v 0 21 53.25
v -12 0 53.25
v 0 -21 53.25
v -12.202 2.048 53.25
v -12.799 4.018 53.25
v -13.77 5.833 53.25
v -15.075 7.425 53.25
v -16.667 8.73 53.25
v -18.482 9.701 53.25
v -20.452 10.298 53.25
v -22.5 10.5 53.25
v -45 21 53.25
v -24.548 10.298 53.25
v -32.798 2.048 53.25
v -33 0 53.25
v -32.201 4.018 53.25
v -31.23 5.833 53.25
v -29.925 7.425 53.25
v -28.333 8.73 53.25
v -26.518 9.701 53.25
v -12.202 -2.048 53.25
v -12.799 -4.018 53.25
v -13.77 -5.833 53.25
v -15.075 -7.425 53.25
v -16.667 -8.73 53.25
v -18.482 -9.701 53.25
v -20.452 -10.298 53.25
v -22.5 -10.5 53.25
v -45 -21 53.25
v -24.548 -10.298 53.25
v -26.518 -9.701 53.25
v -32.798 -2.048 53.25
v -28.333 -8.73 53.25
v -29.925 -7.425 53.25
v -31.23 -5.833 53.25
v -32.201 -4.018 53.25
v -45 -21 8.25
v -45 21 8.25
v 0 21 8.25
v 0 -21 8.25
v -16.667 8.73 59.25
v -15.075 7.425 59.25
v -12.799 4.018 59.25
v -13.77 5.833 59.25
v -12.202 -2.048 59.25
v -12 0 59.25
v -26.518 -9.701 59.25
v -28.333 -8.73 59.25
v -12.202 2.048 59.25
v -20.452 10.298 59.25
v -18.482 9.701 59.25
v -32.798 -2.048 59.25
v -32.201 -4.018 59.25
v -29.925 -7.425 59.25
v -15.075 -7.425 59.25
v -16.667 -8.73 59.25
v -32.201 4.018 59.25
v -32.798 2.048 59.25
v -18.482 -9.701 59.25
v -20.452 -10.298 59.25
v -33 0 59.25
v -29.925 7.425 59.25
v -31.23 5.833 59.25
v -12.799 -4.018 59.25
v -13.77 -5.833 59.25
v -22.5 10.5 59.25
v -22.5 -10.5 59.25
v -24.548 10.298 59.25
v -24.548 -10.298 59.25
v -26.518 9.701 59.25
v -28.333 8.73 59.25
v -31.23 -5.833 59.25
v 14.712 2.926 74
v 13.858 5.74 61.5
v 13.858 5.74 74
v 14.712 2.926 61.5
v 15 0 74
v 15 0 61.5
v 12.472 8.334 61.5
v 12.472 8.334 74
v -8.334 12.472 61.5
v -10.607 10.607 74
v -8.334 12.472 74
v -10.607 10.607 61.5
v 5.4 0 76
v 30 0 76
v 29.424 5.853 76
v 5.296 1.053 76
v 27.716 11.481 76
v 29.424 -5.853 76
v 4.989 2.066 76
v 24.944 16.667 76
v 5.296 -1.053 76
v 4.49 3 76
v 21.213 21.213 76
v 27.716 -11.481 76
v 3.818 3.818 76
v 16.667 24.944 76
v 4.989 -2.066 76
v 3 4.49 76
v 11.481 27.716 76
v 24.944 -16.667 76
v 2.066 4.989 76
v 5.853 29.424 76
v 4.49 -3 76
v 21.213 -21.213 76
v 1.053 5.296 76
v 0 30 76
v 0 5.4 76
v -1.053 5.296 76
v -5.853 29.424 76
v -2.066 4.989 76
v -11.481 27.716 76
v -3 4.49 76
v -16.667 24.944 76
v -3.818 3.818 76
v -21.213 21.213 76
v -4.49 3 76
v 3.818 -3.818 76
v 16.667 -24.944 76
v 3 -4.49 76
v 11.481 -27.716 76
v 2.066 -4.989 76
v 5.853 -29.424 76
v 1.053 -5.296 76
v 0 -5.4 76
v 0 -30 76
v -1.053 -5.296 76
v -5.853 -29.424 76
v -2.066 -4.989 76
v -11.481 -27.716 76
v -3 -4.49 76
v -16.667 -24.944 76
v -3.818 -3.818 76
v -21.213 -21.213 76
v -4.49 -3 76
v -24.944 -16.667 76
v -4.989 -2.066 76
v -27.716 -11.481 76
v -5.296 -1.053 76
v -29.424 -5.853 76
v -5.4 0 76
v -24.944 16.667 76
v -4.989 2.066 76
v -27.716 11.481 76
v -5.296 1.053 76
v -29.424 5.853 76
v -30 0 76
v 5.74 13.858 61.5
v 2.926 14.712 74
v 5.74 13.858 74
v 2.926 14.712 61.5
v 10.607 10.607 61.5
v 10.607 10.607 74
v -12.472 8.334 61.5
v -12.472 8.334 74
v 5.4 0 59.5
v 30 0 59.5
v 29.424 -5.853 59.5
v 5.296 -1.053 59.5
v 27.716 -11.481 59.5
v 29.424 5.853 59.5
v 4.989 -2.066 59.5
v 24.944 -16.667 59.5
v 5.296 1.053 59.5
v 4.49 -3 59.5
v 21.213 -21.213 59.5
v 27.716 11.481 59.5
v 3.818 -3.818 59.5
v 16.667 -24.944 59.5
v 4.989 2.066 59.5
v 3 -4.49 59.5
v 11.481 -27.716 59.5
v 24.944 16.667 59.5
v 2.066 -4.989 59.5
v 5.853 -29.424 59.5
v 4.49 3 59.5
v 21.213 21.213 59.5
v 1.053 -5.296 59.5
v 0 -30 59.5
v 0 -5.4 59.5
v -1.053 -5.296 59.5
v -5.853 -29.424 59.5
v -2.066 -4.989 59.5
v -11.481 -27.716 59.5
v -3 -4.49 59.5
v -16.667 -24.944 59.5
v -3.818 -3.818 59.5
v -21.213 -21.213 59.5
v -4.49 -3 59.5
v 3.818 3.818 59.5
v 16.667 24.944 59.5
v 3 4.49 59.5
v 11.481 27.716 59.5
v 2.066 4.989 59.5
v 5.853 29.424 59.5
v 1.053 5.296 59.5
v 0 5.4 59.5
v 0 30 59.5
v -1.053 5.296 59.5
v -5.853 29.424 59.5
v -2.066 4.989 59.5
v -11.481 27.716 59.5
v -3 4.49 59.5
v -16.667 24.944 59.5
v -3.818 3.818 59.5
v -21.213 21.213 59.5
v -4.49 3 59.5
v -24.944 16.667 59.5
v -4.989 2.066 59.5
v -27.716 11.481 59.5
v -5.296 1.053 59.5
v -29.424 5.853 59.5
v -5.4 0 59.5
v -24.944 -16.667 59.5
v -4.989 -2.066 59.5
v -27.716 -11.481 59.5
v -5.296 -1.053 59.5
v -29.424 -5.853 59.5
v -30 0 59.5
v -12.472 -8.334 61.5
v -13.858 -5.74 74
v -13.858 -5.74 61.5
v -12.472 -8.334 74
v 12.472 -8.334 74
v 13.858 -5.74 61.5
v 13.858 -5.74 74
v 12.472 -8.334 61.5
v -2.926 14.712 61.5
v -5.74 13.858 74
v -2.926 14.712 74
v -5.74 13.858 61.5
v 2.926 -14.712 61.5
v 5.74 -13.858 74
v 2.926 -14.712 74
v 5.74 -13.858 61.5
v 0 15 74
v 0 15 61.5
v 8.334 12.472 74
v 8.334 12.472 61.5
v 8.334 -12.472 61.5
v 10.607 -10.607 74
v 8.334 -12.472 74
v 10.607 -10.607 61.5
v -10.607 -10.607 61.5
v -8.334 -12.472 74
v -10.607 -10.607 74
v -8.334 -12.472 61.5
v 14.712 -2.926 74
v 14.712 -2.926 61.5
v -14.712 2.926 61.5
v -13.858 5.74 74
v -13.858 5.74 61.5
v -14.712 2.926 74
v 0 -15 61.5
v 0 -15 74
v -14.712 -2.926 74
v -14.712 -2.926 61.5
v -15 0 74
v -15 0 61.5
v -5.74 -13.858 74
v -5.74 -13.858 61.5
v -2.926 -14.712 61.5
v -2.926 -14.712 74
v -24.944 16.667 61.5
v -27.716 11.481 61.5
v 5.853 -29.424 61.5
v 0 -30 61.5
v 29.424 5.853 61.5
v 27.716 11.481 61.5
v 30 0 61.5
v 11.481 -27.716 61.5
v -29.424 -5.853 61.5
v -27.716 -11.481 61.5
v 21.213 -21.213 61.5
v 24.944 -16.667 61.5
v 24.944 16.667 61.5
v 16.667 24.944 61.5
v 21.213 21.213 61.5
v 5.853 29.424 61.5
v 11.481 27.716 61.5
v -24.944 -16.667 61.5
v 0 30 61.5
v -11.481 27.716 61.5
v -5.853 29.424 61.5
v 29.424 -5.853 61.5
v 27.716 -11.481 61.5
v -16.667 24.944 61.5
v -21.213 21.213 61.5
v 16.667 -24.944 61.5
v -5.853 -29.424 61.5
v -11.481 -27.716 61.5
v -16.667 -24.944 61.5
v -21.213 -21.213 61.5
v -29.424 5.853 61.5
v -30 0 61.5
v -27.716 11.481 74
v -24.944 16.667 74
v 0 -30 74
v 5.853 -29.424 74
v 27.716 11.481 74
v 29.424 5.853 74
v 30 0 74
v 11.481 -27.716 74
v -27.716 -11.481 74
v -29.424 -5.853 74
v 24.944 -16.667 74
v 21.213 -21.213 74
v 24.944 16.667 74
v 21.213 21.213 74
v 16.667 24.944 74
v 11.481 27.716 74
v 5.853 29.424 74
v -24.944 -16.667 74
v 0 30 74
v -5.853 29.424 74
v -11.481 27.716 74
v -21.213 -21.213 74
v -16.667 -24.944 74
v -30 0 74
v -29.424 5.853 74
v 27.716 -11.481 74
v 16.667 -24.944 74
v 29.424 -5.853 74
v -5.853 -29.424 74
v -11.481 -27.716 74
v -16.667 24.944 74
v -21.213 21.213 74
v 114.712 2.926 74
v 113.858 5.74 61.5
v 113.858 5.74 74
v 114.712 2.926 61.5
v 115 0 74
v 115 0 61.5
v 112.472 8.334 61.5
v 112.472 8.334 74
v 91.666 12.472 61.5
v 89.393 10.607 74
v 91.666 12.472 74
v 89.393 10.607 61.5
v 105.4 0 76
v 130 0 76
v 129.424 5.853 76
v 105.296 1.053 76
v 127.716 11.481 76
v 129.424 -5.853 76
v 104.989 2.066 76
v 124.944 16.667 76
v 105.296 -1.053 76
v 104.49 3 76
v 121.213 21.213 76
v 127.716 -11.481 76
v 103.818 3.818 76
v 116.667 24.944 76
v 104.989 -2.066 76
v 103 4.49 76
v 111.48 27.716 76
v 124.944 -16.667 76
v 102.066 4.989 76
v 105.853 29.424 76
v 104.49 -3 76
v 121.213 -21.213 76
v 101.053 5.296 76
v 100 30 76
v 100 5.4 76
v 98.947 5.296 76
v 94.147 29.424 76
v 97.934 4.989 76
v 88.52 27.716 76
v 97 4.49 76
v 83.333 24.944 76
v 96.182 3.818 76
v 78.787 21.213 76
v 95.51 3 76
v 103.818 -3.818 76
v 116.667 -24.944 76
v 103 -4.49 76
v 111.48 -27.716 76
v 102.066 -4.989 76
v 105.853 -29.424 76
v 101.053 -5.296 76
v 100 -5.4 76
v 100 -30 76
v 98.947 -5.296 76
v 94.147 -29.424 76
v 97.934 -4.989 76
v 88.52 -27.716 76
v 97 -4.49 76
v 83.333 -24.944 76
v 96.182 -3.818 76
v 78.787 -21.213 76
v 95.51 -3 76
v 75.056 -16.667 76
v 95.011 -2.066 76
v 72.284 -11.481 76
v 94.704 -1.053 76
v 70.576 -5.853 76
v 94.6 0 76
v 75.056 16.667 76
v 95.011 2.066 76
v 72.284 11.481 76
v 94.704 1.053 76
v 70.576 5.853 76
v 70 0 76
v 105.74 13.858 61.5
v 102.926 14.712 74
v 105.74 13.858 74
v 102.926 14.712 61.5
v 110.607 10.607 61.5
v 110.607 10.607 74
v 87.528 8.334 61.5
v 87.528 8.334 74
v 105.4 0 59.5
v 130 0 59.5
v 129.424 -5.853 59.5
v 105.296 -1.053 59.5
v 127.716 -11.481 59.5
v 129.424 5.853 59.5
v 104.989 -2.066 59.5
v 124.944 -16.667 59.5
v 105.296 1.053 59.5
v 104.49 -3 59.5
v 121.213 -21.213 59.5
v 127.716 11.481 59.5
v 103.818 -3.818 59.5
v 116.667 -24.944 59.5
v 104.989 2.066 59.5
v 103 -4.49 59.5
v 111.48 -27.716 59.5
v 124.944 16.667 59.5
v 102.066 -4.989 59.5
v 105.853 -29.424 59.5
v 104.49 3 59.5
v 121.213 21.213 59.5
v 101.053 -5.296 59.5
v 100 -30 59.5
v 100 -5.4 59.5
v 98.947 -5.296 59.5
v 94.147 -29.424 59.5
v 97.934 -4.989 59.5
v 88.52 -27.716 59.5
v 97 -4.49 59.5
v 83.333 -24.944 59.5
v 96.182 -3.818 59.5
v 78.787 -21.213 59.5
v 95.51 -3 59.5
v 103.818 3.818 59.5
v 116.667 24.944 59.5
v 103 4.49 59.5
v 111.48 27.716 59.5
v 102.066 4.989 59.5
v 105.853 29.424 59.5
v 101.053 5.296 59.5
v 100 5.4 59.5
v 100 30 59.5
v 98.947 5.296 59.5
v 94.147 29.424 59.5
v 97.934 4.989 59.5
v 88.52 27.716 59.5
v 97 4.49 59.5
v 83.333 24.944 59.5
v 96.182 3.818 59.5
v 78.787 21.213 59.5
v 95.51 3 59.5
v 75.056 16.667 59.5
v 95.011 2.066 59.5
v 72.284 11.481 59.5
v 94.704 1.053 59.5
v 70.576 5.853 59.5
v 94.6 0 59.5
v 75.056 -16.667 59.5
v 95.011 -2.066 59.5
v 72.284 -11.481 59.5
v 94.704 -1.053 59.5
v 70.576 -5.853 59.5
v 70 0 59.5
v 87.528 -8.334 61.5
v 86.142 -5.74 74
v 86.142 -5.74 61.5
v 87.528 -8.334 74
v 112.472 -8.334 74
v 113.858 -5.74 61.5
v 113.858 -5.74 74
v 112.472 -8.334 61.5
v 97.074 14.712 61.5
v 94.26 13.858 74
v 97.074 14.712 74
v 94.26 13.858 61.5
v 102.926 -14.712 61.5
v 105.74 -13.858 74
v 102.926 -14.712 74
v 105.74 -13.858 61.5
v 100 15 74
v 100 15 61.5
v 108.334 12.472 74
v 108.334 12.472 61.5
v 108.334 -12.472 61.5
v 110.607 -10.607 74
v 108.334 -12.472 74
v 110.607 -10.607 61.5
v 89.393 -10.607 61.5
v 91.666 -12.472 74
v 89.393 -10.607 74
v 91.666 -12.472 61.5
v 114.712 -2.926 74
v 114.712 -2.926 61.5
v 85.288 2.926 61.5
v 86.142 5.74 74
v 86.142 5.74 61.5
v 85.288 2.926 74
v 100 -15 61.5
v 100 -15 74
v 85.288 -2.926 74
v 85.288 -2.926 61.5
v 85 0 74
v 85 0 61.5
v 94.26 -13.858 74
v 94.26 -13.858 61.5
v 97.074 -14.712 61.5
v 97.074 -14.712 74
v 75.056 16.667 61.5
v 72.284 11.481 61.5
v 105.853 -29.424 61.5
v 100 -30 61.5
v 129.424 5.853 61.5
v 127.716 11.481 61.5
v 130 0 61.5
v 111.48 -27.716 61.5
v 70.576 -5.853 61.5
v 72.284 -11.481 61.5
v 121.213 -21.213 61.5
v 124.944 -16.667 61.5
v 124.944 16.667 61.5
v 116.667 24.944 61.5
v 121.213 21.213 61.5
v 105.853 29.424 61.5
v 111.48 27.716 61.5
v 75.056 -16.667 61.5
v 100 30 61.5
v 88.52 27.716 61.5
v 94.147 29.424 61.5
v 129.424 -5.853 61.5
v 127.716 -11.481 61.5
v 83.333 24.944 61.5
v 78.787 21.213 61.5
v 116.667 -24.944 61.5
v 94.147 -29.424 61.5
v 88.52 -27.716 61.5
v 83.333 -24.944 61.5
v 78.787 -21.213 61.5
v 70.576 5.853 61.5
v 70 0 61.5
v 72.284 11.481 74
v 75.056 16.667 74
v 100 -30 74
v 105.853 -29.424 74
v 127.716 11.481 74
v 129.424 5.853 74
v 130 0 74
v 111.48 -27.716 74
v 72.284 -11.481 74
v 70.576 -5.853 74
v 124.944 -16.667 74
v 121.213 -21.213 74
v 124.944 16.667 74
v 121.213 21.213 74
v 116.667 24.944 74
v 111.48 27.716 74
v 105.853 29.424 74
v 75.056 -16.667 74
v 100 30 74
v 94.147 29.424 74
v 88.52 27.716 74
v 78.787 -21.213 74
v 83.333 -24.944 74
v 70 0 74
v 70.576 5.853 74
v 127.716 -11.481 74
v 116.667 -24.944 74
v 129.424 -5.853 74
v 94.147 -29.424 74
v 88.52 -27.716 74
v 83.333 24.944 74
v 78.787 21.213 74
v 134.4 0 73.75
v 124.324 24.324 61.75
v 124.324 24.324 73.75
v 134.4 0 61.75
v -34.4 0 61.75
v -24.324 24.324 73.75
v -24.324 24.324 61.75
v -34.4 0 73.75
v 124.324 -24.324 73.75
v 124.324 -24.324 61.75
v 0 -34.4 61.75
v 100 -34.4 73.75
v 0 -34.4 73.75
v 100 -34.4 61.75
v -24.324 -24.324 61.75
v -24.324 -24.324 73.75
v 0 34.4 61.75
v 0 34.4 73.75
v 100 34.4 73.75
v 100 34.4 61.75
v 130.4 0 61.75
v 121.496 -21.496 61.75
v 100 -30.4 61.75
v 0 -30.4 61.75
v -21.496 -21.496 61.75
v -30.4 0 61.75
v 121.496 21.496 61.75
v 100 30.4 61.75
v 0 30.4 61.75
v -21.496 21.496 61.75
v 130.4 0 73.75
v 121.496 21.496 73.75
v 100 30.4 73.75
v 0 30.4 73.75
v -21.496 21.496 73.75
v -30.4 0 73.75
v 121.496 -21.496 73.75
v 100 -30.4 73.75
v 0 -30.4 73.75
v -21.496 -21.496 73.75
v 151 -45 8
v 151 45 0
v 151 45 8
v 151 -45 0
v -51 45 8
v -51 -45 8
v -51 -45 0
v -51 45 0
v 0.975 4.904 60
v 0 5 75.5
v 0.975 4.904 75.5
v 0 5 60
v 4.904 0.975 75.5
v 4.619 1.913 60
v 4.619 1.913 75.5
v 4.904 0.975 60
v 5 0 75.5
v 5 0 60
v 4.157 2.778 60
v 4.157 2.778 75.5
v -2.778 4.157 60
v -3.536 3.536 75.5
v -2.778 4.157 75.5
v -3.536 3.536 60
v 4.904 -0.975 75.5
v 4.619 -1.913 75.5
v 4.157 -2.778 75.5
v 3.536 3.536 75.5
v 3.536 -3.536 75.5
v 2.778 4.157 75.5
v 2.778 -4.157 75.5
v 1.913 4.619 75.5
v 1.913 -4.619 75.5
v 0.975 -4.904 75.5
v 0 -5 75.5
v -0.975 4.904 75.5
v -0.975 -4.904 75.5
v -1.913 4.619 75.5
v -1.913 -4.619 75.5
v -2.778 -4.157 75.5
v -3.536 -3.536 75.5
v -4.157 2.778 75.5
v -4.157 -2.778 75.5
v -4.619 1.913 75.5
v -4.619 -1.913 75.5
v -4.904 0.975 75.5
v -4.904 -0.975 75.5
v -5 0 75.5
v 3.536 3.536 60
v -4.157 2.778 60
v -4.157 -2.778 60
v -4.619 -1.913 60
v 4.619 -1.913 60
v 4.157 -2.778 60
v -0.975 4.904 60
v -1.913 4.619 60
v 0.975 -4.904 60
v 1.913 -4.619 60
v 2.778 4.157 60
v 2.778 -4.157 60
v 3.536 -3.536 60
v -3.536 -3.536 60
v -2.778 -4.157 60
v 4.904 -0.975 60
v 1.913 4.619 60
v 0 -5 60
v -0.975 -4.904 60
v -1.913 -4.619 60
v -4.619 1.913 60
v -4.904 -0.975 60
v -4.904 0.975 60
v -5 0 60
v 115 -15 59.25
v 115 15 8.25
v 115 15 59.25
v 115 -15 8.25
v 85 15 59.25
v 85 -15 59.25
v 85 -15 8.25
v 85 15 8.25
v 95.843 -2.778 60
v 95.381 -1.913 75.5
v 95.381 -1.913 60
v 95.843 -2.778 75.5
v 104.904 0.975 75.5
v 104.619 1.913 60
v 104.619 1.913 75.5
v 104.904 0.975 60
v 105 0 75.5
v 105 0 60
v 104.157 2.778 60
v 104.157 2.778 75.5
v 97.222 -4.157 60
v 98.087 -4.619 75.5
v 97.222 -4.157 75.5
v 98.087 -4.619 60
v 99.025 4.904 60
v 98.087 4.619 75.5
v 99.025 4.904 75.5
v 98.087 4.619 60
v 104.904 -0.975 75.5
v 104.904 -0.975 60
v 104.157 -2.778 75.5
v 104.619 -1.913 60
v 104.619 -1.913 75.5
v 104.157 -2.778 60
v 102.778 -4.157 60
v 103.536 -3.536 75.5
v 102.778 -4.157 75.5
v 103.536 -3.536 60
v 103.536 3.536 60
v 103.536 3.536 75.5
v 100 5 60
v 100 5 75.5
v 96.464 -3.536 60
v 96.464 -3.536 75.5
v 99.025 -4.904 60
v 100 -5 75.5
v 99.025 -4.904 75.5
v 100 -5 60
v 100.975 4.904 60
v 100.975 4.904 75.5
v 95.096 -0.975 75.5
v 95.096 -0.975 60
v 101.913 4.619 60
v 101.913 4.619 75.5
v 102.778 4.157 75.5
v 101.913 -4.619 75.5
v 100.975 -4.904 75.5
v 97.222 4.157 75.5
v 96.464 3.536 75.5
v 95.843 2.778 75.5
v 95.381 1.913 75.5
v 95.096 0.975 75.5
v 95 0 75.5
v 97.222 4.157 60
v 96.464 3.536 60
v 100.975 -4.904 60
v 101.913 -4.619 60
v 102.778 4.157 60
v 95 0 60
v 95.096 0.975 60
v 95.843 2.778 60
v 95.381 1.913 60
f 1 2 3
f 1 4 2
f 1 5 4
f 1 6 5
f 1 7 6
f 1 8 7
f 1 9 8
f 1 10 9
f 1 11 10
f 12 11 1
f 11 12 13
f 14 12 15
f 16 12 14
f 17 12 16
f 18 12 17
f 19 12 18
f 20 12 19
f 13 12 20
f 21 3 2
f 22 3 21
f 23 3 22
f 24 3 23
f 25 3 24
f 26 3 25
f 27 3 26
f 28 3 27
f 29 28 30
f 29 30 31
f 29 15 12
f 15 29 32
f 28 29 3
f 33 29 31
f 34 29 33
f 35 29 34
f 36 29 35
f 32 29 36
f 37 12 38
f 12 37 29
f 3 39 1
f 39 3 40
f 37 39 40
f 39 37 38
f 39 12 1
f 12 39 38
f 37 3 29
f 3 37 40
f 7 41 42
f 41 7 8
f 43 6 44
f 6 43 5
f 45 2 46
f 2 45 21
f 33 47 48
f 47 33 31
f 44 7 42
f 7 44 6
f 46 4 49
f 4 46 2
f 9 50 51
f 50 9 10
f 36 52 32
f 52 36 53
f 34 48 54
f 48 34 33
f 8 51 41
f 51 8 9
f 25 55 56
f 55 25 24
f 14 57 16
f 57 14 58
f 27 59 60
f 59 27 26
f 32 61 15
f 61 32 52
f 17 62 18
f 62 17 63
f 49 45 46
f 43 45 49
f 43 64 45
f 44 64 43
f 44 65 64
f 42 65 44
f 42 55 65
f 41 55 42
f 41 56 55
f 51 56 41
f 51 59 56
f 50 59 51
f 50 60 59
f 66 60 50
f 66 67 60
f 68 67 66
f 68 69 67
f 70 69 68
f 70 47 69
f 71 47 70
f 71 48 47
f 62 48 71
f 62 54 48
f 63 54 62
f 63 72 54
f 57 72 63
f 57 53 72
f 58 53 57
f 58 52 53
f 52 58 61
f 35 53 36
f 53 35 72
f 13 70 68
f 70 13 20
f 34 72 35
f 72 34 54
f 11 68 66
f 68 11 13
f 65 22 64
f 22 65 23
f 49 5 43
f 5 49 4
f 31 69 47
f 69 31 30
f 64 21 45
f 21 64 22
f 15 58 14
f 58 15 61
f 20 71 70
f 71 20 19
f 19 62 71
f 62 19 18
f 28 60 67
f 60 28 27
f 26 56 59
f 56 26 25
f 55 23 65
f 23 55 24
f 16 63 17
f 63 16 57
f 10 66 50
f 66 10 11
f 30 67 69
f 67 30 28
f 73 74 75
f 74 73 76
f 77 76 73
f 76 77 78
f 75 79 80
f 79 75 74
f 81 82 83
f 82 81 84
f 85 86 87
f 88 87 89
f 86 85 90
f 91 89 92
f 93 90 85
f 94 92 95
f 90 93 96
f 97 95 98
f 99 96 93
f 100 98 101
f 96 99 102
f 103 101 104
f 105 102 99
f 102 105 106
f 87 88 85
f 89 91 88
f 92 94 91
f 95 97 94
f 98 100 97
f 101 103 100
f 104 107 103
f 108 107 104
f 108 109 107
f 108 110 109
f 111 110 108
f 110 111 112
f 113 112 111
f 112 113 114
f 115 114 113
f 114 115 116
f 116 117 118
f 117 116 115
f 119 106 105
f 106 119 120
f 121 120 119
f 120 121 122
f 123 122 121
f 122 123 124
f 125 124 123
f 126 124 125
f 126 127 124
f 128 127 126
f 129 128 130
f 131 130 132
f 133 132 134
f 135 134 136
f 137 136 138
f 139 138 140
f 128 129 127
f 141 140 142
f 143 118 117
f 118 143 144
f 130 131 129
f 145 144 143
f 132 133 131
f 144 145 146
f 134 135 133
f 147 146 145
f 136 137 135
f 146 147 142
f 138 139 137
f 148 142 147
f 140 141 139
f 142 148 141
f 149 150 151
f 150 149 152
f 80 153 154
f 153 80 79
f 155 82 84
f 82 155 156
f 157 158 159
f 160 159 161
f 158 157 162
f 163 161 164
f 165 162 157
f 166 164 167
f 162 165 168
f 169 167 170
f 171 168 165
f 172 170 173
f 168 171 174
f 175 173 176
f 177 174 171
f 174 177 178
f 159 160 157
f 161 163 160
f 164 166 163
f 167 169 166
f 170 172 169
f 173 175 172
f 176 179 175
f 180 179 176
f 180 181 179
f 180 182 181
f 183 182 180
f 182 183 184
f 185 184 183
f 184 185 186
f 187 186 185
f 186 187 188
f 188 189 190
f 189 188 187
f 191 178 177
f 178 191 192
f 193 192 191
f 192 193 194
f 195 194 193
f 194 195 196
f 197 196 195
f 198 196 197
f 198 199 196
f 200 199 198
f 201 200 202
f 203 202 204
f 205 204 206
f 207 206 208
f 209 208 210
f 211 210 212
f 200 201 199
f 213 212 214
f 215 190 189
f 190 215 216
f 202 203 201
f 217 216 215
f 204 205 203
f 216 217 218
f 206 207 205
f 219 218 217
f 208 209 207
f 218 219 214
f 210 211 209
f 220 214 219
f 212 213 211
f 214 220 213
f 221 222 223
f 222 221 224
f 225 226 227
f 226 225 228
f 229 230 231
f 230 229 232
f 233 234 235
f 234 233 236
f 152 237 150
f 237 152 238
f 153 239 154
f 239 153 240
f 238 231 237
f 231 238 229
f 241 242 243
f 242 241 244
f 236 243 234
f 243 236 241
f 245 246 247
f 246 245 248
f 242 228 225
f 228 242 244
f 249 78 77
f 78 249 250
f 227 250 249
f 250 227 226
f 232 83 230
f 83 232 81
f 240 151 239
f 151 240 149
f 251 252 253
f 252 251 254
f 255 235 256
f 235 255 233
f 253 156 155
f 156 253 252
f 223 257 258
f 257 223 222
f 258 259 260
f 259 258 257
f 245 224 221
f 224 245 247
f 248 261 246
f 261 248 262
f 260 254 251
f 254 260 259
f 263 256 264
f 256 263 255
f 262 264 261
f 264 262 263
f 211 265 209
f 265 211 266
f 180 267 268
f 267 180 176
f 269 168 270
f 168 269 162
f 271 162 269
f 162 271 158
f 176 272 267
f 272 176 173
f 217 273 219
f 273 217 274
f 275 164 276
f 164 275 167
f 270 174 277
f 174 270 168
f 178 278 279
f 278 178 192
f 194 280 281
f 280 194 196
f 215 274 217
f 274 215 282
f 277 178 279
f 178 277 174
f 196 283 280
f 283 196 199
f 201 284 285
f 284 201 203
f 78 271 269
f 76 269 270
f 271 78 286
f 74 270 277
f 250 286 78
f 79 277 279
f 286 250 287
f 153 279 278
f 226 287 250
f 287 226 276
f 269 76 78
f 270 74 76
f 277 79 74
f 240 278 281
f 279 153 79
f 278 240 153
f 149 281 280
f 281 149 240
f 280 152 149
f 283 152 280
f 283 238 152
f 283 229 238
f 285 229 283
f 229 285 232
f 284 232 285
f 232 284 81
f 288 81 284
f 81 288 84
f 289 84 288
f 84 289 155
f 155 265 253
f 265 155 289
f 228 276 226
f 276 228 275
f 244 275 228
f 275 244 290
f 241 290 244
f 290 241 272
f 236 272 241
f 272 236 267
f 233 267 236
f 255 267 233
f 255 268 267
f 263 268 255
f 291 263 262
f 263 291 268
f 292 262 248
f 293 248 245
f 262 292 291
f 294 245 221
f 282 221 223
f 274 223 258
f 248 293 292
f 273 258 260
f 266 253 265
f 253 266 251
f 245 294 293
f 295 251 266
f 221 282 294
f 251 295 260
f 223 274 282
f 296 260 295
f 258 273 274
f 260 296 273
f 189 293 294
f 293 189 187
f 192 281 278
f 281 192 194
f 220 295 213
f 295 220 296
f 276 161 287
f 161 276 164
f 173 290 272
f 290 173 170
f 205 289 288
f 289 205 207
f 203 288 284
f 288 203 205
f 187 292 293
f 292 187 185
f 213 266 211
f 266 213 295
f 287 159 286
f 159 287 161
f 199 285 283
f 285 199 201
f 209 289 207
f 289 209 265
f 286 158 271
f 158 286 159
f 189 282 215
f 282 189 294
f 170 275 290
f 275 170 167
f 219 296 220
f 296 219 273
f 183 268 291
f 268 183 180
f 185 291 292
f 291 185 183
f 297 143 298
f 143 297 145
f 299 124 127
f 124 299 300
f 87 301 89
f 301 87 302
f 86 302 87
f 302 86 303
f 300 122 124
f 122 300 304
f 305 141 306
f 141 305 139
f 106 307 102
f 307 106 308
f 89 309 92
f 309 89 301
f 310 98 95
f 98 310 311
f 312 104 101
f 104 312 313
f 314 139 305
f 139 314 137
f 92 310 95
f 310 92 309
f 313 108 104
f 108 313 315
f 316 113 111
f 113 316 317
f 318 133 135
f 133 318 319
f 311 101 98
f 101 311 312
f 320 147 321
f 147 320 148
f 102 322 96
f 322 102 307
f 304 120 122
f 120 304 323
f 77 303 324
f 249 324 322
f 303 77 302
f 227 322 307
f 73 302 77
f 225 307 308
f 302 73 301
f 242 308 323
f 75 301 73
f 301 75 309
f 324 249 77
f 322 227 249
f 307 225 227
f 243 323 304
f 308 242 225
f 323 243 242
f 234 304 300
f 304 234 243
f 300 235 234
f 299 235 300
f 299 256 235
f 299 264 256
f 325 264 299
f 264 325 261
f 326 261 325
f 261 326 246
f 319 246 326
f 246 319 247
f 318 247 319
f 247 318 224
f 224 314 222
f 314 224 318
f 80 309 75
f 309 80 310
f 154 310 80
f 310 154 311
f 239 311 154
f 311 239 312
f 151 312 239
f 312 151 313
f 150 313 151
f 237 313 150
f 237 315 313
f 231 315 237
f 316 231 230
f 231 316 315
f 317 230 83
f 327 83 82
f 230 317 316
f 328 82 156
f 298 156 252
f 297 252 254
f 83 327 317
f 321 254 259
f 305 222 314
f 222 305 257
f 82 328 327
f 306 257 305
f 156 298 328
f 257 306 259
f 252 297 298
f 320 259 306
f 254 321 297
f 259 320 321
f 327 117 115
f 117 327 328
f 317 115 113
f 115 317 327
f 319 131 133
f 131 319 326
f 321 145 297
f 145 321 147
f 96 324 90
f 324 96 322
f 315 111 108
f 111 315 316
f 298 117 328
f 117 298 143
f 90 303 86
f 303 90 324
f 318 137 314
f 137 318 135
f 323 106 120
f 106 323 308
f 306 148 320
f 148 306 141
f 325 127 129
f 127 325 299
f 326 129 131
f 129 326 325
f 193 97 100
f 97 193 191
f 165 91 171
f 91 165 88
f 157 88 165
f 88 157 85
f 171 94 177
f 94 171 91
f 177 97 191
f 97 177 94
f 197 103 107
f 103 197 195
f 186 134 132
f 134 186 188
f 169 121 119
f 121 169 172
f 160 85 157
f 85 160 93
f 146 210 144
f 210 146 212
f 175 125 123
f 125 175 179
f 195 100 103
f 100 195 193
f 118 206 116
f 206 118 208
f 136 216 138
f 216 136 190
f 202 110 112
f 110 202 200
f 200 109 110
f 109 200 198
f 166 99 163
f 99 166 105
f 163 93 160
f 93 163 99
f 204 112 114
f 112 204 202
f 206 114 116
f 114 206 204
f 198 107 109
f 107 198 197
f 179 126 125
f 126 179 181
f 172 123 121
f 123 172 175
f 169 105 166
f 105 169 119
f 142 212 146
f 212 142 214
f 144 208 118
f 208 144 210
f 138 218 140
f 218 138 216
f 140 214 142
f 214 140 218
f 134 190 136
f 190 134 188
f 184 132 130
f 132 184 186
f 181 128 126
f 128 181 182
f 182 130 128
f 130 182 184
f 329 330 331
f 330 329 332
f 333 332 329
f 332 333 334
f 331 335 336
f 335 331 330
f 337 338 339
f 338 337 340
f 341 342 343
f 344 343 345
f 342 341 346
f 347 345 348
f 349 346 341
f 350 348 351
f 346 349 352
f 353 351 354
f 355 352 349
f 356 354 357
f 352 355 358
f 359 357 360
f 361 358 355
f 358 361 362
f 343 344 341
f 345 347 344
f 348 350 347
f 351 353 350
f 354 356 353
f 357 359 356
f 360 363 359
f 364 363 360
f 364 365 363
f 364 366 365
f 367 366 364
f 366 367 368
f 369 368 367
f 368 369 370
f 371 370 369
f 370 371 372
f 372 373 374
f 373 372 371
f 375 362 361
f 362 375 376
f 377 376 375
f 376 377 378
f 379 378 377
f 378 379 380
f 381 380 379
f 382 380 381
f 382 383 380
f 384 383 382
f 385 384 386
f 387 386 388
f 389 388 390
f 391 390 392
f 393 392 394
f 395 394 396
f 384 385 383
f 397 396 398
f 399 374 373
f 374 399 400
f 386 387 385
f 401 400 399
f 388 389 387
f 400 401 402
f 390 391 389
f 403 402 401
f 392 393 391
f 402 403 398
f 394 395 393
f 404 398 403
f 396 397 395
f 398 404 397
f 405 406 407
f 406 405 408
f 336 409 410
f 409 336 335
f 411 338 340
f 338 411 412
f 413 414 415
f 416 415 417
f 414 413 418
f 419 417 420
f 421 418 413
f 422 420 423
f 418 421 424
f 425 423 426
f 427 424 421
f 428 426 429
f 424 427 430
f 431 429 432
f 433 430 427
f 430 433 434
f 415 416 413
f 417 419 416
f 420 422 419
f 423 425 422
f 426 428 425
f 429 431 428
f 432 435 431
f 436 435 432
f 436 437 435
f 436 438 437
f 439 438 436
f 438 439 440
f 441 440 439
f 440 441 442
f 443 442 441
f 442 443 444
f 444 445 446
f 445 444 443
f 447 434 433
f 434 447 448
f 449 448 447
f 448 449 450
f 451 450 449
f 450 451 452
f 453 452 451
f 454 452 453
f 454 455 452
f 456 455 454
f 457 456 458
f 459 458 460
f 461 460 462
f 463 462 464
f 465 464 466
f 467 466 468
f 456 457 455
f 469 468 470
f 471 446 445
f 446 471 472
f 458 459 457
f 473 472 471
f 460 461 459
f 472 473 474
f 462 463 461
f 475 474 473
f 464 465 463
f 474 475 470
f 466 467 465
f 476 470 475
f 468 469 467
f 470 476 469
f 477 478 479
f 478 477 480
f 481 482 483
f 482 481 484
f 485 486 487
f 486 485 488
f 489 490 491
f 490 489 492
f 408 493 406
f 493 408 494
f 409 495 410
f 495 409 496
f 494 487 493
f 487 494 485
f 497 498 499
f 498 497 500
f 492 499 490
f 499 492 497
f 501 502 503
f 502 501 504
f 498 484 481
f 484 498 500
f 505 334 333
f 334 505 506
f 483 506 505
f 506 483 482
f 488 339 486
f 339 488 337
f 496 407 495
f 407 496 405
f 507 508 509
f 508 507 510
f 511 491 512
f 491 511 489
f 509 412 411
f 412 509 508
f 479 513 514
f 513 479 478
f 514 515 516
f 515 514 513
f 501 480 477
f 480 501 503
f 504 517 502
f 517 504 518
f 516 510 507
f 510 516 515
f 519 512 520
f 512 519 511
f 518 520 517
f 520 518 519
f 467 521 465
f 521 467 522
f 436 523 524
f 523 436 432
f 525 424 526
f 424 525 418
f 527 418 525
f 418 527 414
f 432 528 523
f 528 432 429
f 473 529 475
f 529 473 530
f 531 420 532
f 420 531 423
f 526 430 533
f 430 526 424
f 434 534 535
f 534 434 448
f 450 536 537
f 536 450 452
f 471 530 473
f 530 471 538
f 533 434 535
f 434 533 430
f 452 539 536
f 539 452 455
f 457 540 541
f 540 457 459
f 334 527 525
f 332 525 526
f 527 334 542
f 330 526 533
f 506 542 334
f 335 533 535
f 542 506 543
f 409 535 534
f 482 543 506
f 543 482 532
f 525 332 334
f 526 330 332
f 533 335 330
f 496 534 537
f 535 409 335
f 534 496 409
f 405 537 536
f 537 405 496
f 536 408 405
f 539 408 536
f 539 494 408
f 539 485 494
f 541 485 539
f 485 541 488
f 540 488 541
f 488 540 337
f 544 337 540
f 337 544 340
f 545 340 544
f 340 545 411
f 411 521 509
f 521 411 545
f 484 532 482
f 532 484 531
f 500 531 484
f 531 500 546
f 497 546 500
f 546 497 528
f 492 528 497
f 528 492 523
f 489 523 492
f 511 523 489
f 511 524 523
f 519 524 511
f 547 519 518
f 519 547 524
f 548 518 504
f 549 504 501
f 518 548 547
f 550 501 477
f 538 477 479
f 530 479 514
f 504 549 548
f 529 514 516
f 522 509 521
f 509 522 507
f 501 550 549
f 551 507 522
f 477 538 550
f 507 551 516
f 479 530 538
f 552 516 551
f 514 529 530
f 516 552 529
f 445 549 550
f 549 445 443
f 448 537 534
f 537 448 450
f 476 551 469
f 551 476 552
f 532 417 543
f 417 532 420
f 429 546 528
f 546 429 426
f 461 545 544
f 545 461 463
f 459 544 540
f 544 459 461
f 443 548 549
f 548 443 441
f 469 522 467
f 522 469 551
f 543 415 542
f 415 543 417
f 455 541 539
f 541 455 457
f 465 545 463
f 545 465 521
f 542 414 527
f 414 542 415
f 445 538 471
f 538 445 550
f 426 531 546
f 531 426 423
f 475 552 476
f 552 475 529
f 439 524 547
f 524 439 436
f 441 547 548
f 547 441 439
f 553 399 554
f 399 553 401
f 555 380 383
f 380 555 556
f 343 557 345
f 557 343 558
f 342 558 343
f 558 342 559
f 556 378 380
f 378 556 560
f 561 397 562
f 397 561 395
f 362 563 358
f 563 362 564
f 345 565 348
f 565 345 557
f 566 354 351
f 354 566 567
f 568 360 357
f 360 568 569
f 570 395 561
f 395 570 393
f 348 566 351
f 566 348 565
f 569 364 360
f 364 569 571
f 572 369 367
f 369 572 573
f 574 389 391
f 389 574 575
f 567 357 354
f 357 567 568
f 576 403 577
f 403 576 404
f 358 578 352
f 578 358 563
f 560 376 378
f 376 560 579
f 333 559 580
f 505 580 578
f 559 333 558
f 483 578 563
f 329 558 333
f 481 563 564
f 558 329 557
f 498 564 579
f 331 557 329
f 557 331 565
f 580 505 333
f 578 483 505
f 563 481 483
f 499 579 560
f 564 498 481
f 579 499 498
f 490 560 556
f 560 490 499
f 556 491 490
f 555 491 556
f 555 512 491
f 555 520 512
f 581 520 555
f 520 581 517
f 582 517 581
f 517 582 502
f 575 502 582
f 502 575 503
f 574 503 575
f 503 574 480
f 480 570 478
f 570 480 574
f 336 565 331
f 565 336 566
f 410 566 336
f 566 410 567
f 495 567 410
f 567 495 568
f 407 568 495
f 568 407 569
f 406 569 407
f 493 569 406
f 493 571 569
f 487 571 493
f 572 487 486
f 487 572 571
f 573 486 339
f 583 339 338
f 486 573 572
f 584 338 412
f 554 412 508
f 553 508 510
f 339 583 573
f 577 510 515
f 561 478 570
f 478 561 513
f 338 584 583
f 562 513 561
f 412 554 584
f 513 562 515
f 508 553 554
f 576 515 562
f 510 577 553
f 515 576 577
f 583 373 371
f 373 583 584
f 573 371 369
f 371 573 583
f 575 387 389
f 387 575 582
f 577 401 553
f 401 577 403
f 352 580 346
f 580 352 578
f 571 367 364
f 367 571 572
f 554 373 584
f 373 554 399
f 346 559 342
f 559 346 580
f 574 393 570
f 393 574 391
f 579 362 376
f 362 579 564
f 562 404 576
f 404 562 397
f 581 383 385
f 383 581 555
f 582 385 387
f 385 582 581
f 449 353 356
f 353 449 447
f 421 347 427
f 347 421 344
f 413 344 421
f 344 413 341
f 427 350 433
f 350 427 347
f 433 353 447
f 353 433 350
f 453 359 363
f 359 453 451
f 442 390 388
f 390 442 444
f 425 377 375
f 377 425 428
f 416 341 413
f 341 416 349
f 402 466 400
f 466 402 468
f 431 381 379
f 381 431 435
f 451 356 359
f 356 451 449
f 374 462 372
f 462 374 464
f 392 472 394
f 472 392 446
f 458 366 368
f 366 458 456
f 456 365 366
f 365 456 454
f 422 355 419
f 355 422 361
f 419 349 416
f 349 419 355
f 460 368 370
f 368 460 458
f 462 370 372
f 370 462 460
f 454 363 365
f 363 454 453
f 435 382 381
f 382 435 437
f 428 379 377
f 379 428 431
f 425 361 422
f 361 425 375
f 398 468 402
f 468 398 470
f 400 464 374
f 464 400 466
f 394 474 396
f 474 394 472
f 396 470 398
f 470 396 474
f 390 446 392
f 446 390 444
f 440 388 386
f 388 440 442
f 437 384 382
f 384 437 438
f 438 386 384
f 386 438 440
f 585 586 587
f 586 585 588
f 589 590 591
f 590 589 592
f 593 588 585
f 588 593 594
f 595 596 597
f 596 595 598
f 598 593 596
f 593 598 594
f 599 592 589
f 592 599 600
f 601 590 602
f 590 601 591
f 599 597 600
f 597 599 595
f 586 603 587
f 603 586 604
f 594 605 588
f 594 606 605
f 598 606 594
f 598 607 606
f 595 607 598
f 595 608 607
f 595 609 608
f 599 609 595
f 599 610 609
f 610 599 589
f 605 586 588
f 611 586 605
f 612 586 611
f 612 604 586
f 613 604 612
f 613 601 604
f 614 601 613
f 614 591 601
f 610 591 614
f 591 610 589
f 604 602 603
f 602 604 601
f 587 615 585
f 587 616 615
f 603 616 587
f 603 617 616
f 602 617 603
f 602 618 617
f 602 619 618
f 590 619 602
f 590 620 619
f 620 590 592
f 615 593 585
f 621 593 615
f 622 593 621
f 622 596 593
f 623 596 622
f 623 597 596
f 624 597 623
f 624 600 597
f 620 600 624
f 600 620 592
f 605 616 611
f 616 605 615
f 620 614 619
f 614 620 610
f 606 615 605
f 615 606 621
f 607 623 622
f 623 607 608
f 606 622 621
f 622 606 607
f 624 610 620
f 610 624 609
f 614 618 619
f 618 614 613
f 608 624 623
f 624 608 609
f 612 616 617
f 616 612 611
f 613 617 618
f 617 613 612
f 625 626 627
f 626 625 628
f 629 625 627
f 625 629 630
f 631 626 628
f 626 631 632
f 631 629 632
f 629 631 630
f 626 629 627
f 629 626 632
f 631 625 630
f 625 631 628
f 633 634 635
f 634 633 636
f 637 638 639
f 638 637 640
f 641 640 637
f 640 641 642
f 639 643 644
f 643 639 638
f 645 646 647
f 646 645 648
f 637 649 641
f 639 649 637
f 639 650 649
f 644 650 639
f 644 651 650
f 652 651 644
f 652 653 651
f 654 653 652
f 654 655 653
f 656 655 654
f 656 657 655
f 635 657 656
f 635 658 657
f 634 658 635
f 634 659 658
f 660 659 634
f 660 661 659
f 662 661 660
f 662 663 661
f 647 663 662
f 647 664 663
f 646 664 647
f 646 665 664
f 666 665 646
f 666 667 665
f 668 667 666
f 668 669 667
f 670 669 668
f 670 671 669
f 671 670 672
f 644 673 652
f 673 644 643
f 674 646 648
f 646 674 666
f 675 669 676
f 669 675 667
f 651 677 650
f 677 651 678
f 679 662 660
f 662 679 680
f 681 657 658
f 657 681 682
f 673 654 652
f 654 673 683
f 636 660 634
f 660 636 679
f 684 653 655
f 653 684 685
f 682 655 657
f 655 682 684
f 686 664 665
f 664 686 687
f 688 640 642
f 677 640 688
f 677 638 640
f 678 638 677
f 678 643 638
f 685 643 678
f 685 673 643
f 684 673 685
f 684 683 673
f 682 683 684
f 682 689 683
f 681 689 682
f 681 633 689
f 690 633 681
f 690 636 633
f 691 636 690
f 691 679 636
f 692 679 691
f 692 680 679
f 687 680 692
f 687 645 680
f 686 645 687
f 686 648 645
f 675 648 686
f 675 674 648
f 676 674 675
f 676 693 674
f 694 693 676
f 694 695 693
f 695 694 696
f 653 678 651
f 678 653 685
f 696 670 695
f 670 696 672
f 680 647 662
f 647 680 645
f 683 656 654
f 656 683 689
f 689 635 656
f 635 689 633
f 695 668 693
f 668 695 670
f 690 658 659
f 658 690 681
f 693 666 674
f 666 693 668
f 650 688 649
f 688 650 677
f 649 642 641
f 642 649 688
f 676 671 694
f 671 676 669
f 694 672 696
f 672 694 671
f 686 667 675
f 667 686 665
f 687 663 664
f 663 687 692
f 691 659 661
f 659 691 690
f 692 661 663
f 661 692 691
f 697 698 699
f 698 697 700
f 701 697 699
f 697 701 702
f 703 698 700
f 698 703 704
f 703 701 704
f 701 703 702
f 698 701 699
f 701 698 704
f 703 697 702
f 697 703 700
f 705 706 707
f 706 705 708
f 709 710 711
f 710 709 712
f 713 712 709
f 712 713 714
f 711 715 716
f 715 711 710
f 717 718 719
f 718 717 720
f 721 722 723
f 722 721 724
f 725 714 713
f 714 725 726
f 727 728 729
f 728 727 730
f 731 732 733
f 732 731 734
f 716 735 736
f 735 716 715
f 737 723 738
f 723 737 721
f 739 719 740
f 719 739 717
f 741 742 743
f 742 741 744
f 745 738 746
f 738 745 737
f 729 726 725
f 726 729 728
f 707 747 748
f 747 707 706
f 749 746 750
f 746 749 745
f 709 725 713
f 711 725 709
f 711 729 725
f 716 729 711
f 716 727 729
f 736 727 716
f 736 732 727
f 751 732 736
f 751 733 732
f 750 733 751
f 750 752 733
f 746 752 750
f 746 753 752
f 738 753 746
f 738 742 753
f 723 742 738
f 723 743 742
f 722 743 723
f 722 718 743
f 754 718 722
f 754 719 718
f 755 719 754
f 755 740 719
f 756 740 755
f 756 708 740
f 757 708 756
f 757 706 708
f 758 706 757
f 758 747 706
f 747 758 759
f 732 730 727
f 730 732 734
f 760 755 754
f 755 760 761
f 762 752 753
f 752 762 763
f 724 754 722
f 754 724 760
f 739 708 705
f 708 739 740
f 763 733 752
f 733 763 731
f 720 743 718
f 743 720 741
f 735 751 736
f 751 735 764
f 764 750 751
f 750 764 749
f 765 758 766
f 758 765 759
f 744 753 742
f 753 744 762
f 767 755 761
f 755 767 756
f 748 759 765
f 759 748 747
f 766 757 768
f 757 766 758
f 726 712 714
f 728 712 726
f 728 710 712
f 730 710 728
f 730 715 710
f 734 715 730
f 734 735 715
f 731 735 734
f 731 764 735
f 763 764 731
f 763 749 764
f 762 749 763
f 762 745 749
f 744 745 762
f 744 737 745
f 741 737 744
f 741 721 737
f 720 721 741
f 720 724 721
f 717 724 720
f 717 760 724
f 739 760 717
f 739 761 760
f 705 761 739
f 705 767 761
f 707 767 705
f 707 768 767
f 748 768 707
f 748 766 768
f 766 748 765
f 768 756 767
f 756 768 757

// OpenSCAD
$fn = 32;

// ------------------------------------------------------------------------
// Motor belt drive: span 100 mm, pulleys d60, belt 12 mm wide
// Every part is its own module, assembly() places every instance.
// ------------------------------------------------------------------------

// --- part 1 ---
module base_plate() {
  difference() {
    translate([-101, -45, 0]) cube([202, 90, 8]);
  }
}

// --- part 2 ---
module motor() {
  union() {
    translate([-22.5, -21, 0]) cube([45, 42, 45]);
    translate([25.5, 0, 22.5]) rotate([0, 90, 0]) cylinder(h = 6, d = 21, center = true);
  }
}

// --- part 3 ---
module drive_shaft() {
  translate([0, 0, -7.75]) cylinder(h = 15.5, d = 10);
}

// --- part 4 ---
module pulley_drive() {
  difference() {
    union() {
      cylinder(h = 16.5, d = 30);
      cylinder(h = 2, d = 60);
      translate([0, 0, 14.5]) cylinder(h = 2, d = 60);
    }
    translate([0, 0, -1]) cylinder(h = 18.5, d = 10.8);
  }
}

// --- part 5 ---
module idler_post() {
  translate([-15, -15, 0]) cube([30, 30, 51]);
}

// --- part 6 ---
module driven_shaft() {
  translate([0, 0, -7.75]) cylinder(h = 15.5, d = 10);
}

// --- part 7 ---
module pulley_driven() {
  difference() {
    union() {
      cylinder(h = 16.5, d = 30);
      cylinder(h = 2, d = 60);
      translate([0, 0, 14.5]) cylinder(h = 2, d = 60);
    }
    translate([0, 0, -1]) cylinder(h = 18.5, d = 10.8);
  }
}

// --- part 8 ---
module drive_belt() {
  difference() {
    linear_extrude(height = 12) polygon(points = concat([for (a = [90 : 45 : 270]) [34.4 * cos(a), 34.4 * sin(a)]], [for (a = [270 : 45 : 450]) [100 + 34.4 * cos(a), 34.4 * sin(a)]]));
    translate([0, 0, -1]) linear_extrude(height = 14) polygon(points = concat([for (a = [90 : 45 : 270]) [30.4 * cos(a), 30.4 * sin(a)]], [for (a = [270 : 45 : 450]) [100 + 30.4 * cos(a), 30.4 * sin(a)]]));
  }
}

// --- assembly ---
module assembly() {
  color([0.80, 0.24, 0.20]) translate([50, 0, 0]) rotate([0, 0, 0]) base_plate();
  color([0.20, 0.45, 0.75]) translate([0, 0, 30.75]) rotate([0, 270, 0]) motor();
  color([0.25, 0.62, 0.32]) translate([0, 0, 67.75]) rotate([0, 0, 0]) drive_shaft();
  color([0.92, 0.70, 0.18]) translate([0, 0, 59.5]) rotate([0, 0, 0]) pulley_drive();
  color([0.58, 0.35, 0.70]) translate([100, 0, 8.25]) rotate([0, 0, 0]) idler_post();
  color([0.16, 0.66, 0.66]) translate([100, 0, 67.75]) rotate([0, 0, 0]) driven_shaft();
  color([0.85, 0.48, 0.18]) translate([100, 0, 59.5]) rotate([0, 0, 0]) pulley_driven();
  color([0.55, 0.60, 0.65]) translate([0, 0, 61.75]) rotate([0, 0, 0]) drive_belt();
}

assembly();
